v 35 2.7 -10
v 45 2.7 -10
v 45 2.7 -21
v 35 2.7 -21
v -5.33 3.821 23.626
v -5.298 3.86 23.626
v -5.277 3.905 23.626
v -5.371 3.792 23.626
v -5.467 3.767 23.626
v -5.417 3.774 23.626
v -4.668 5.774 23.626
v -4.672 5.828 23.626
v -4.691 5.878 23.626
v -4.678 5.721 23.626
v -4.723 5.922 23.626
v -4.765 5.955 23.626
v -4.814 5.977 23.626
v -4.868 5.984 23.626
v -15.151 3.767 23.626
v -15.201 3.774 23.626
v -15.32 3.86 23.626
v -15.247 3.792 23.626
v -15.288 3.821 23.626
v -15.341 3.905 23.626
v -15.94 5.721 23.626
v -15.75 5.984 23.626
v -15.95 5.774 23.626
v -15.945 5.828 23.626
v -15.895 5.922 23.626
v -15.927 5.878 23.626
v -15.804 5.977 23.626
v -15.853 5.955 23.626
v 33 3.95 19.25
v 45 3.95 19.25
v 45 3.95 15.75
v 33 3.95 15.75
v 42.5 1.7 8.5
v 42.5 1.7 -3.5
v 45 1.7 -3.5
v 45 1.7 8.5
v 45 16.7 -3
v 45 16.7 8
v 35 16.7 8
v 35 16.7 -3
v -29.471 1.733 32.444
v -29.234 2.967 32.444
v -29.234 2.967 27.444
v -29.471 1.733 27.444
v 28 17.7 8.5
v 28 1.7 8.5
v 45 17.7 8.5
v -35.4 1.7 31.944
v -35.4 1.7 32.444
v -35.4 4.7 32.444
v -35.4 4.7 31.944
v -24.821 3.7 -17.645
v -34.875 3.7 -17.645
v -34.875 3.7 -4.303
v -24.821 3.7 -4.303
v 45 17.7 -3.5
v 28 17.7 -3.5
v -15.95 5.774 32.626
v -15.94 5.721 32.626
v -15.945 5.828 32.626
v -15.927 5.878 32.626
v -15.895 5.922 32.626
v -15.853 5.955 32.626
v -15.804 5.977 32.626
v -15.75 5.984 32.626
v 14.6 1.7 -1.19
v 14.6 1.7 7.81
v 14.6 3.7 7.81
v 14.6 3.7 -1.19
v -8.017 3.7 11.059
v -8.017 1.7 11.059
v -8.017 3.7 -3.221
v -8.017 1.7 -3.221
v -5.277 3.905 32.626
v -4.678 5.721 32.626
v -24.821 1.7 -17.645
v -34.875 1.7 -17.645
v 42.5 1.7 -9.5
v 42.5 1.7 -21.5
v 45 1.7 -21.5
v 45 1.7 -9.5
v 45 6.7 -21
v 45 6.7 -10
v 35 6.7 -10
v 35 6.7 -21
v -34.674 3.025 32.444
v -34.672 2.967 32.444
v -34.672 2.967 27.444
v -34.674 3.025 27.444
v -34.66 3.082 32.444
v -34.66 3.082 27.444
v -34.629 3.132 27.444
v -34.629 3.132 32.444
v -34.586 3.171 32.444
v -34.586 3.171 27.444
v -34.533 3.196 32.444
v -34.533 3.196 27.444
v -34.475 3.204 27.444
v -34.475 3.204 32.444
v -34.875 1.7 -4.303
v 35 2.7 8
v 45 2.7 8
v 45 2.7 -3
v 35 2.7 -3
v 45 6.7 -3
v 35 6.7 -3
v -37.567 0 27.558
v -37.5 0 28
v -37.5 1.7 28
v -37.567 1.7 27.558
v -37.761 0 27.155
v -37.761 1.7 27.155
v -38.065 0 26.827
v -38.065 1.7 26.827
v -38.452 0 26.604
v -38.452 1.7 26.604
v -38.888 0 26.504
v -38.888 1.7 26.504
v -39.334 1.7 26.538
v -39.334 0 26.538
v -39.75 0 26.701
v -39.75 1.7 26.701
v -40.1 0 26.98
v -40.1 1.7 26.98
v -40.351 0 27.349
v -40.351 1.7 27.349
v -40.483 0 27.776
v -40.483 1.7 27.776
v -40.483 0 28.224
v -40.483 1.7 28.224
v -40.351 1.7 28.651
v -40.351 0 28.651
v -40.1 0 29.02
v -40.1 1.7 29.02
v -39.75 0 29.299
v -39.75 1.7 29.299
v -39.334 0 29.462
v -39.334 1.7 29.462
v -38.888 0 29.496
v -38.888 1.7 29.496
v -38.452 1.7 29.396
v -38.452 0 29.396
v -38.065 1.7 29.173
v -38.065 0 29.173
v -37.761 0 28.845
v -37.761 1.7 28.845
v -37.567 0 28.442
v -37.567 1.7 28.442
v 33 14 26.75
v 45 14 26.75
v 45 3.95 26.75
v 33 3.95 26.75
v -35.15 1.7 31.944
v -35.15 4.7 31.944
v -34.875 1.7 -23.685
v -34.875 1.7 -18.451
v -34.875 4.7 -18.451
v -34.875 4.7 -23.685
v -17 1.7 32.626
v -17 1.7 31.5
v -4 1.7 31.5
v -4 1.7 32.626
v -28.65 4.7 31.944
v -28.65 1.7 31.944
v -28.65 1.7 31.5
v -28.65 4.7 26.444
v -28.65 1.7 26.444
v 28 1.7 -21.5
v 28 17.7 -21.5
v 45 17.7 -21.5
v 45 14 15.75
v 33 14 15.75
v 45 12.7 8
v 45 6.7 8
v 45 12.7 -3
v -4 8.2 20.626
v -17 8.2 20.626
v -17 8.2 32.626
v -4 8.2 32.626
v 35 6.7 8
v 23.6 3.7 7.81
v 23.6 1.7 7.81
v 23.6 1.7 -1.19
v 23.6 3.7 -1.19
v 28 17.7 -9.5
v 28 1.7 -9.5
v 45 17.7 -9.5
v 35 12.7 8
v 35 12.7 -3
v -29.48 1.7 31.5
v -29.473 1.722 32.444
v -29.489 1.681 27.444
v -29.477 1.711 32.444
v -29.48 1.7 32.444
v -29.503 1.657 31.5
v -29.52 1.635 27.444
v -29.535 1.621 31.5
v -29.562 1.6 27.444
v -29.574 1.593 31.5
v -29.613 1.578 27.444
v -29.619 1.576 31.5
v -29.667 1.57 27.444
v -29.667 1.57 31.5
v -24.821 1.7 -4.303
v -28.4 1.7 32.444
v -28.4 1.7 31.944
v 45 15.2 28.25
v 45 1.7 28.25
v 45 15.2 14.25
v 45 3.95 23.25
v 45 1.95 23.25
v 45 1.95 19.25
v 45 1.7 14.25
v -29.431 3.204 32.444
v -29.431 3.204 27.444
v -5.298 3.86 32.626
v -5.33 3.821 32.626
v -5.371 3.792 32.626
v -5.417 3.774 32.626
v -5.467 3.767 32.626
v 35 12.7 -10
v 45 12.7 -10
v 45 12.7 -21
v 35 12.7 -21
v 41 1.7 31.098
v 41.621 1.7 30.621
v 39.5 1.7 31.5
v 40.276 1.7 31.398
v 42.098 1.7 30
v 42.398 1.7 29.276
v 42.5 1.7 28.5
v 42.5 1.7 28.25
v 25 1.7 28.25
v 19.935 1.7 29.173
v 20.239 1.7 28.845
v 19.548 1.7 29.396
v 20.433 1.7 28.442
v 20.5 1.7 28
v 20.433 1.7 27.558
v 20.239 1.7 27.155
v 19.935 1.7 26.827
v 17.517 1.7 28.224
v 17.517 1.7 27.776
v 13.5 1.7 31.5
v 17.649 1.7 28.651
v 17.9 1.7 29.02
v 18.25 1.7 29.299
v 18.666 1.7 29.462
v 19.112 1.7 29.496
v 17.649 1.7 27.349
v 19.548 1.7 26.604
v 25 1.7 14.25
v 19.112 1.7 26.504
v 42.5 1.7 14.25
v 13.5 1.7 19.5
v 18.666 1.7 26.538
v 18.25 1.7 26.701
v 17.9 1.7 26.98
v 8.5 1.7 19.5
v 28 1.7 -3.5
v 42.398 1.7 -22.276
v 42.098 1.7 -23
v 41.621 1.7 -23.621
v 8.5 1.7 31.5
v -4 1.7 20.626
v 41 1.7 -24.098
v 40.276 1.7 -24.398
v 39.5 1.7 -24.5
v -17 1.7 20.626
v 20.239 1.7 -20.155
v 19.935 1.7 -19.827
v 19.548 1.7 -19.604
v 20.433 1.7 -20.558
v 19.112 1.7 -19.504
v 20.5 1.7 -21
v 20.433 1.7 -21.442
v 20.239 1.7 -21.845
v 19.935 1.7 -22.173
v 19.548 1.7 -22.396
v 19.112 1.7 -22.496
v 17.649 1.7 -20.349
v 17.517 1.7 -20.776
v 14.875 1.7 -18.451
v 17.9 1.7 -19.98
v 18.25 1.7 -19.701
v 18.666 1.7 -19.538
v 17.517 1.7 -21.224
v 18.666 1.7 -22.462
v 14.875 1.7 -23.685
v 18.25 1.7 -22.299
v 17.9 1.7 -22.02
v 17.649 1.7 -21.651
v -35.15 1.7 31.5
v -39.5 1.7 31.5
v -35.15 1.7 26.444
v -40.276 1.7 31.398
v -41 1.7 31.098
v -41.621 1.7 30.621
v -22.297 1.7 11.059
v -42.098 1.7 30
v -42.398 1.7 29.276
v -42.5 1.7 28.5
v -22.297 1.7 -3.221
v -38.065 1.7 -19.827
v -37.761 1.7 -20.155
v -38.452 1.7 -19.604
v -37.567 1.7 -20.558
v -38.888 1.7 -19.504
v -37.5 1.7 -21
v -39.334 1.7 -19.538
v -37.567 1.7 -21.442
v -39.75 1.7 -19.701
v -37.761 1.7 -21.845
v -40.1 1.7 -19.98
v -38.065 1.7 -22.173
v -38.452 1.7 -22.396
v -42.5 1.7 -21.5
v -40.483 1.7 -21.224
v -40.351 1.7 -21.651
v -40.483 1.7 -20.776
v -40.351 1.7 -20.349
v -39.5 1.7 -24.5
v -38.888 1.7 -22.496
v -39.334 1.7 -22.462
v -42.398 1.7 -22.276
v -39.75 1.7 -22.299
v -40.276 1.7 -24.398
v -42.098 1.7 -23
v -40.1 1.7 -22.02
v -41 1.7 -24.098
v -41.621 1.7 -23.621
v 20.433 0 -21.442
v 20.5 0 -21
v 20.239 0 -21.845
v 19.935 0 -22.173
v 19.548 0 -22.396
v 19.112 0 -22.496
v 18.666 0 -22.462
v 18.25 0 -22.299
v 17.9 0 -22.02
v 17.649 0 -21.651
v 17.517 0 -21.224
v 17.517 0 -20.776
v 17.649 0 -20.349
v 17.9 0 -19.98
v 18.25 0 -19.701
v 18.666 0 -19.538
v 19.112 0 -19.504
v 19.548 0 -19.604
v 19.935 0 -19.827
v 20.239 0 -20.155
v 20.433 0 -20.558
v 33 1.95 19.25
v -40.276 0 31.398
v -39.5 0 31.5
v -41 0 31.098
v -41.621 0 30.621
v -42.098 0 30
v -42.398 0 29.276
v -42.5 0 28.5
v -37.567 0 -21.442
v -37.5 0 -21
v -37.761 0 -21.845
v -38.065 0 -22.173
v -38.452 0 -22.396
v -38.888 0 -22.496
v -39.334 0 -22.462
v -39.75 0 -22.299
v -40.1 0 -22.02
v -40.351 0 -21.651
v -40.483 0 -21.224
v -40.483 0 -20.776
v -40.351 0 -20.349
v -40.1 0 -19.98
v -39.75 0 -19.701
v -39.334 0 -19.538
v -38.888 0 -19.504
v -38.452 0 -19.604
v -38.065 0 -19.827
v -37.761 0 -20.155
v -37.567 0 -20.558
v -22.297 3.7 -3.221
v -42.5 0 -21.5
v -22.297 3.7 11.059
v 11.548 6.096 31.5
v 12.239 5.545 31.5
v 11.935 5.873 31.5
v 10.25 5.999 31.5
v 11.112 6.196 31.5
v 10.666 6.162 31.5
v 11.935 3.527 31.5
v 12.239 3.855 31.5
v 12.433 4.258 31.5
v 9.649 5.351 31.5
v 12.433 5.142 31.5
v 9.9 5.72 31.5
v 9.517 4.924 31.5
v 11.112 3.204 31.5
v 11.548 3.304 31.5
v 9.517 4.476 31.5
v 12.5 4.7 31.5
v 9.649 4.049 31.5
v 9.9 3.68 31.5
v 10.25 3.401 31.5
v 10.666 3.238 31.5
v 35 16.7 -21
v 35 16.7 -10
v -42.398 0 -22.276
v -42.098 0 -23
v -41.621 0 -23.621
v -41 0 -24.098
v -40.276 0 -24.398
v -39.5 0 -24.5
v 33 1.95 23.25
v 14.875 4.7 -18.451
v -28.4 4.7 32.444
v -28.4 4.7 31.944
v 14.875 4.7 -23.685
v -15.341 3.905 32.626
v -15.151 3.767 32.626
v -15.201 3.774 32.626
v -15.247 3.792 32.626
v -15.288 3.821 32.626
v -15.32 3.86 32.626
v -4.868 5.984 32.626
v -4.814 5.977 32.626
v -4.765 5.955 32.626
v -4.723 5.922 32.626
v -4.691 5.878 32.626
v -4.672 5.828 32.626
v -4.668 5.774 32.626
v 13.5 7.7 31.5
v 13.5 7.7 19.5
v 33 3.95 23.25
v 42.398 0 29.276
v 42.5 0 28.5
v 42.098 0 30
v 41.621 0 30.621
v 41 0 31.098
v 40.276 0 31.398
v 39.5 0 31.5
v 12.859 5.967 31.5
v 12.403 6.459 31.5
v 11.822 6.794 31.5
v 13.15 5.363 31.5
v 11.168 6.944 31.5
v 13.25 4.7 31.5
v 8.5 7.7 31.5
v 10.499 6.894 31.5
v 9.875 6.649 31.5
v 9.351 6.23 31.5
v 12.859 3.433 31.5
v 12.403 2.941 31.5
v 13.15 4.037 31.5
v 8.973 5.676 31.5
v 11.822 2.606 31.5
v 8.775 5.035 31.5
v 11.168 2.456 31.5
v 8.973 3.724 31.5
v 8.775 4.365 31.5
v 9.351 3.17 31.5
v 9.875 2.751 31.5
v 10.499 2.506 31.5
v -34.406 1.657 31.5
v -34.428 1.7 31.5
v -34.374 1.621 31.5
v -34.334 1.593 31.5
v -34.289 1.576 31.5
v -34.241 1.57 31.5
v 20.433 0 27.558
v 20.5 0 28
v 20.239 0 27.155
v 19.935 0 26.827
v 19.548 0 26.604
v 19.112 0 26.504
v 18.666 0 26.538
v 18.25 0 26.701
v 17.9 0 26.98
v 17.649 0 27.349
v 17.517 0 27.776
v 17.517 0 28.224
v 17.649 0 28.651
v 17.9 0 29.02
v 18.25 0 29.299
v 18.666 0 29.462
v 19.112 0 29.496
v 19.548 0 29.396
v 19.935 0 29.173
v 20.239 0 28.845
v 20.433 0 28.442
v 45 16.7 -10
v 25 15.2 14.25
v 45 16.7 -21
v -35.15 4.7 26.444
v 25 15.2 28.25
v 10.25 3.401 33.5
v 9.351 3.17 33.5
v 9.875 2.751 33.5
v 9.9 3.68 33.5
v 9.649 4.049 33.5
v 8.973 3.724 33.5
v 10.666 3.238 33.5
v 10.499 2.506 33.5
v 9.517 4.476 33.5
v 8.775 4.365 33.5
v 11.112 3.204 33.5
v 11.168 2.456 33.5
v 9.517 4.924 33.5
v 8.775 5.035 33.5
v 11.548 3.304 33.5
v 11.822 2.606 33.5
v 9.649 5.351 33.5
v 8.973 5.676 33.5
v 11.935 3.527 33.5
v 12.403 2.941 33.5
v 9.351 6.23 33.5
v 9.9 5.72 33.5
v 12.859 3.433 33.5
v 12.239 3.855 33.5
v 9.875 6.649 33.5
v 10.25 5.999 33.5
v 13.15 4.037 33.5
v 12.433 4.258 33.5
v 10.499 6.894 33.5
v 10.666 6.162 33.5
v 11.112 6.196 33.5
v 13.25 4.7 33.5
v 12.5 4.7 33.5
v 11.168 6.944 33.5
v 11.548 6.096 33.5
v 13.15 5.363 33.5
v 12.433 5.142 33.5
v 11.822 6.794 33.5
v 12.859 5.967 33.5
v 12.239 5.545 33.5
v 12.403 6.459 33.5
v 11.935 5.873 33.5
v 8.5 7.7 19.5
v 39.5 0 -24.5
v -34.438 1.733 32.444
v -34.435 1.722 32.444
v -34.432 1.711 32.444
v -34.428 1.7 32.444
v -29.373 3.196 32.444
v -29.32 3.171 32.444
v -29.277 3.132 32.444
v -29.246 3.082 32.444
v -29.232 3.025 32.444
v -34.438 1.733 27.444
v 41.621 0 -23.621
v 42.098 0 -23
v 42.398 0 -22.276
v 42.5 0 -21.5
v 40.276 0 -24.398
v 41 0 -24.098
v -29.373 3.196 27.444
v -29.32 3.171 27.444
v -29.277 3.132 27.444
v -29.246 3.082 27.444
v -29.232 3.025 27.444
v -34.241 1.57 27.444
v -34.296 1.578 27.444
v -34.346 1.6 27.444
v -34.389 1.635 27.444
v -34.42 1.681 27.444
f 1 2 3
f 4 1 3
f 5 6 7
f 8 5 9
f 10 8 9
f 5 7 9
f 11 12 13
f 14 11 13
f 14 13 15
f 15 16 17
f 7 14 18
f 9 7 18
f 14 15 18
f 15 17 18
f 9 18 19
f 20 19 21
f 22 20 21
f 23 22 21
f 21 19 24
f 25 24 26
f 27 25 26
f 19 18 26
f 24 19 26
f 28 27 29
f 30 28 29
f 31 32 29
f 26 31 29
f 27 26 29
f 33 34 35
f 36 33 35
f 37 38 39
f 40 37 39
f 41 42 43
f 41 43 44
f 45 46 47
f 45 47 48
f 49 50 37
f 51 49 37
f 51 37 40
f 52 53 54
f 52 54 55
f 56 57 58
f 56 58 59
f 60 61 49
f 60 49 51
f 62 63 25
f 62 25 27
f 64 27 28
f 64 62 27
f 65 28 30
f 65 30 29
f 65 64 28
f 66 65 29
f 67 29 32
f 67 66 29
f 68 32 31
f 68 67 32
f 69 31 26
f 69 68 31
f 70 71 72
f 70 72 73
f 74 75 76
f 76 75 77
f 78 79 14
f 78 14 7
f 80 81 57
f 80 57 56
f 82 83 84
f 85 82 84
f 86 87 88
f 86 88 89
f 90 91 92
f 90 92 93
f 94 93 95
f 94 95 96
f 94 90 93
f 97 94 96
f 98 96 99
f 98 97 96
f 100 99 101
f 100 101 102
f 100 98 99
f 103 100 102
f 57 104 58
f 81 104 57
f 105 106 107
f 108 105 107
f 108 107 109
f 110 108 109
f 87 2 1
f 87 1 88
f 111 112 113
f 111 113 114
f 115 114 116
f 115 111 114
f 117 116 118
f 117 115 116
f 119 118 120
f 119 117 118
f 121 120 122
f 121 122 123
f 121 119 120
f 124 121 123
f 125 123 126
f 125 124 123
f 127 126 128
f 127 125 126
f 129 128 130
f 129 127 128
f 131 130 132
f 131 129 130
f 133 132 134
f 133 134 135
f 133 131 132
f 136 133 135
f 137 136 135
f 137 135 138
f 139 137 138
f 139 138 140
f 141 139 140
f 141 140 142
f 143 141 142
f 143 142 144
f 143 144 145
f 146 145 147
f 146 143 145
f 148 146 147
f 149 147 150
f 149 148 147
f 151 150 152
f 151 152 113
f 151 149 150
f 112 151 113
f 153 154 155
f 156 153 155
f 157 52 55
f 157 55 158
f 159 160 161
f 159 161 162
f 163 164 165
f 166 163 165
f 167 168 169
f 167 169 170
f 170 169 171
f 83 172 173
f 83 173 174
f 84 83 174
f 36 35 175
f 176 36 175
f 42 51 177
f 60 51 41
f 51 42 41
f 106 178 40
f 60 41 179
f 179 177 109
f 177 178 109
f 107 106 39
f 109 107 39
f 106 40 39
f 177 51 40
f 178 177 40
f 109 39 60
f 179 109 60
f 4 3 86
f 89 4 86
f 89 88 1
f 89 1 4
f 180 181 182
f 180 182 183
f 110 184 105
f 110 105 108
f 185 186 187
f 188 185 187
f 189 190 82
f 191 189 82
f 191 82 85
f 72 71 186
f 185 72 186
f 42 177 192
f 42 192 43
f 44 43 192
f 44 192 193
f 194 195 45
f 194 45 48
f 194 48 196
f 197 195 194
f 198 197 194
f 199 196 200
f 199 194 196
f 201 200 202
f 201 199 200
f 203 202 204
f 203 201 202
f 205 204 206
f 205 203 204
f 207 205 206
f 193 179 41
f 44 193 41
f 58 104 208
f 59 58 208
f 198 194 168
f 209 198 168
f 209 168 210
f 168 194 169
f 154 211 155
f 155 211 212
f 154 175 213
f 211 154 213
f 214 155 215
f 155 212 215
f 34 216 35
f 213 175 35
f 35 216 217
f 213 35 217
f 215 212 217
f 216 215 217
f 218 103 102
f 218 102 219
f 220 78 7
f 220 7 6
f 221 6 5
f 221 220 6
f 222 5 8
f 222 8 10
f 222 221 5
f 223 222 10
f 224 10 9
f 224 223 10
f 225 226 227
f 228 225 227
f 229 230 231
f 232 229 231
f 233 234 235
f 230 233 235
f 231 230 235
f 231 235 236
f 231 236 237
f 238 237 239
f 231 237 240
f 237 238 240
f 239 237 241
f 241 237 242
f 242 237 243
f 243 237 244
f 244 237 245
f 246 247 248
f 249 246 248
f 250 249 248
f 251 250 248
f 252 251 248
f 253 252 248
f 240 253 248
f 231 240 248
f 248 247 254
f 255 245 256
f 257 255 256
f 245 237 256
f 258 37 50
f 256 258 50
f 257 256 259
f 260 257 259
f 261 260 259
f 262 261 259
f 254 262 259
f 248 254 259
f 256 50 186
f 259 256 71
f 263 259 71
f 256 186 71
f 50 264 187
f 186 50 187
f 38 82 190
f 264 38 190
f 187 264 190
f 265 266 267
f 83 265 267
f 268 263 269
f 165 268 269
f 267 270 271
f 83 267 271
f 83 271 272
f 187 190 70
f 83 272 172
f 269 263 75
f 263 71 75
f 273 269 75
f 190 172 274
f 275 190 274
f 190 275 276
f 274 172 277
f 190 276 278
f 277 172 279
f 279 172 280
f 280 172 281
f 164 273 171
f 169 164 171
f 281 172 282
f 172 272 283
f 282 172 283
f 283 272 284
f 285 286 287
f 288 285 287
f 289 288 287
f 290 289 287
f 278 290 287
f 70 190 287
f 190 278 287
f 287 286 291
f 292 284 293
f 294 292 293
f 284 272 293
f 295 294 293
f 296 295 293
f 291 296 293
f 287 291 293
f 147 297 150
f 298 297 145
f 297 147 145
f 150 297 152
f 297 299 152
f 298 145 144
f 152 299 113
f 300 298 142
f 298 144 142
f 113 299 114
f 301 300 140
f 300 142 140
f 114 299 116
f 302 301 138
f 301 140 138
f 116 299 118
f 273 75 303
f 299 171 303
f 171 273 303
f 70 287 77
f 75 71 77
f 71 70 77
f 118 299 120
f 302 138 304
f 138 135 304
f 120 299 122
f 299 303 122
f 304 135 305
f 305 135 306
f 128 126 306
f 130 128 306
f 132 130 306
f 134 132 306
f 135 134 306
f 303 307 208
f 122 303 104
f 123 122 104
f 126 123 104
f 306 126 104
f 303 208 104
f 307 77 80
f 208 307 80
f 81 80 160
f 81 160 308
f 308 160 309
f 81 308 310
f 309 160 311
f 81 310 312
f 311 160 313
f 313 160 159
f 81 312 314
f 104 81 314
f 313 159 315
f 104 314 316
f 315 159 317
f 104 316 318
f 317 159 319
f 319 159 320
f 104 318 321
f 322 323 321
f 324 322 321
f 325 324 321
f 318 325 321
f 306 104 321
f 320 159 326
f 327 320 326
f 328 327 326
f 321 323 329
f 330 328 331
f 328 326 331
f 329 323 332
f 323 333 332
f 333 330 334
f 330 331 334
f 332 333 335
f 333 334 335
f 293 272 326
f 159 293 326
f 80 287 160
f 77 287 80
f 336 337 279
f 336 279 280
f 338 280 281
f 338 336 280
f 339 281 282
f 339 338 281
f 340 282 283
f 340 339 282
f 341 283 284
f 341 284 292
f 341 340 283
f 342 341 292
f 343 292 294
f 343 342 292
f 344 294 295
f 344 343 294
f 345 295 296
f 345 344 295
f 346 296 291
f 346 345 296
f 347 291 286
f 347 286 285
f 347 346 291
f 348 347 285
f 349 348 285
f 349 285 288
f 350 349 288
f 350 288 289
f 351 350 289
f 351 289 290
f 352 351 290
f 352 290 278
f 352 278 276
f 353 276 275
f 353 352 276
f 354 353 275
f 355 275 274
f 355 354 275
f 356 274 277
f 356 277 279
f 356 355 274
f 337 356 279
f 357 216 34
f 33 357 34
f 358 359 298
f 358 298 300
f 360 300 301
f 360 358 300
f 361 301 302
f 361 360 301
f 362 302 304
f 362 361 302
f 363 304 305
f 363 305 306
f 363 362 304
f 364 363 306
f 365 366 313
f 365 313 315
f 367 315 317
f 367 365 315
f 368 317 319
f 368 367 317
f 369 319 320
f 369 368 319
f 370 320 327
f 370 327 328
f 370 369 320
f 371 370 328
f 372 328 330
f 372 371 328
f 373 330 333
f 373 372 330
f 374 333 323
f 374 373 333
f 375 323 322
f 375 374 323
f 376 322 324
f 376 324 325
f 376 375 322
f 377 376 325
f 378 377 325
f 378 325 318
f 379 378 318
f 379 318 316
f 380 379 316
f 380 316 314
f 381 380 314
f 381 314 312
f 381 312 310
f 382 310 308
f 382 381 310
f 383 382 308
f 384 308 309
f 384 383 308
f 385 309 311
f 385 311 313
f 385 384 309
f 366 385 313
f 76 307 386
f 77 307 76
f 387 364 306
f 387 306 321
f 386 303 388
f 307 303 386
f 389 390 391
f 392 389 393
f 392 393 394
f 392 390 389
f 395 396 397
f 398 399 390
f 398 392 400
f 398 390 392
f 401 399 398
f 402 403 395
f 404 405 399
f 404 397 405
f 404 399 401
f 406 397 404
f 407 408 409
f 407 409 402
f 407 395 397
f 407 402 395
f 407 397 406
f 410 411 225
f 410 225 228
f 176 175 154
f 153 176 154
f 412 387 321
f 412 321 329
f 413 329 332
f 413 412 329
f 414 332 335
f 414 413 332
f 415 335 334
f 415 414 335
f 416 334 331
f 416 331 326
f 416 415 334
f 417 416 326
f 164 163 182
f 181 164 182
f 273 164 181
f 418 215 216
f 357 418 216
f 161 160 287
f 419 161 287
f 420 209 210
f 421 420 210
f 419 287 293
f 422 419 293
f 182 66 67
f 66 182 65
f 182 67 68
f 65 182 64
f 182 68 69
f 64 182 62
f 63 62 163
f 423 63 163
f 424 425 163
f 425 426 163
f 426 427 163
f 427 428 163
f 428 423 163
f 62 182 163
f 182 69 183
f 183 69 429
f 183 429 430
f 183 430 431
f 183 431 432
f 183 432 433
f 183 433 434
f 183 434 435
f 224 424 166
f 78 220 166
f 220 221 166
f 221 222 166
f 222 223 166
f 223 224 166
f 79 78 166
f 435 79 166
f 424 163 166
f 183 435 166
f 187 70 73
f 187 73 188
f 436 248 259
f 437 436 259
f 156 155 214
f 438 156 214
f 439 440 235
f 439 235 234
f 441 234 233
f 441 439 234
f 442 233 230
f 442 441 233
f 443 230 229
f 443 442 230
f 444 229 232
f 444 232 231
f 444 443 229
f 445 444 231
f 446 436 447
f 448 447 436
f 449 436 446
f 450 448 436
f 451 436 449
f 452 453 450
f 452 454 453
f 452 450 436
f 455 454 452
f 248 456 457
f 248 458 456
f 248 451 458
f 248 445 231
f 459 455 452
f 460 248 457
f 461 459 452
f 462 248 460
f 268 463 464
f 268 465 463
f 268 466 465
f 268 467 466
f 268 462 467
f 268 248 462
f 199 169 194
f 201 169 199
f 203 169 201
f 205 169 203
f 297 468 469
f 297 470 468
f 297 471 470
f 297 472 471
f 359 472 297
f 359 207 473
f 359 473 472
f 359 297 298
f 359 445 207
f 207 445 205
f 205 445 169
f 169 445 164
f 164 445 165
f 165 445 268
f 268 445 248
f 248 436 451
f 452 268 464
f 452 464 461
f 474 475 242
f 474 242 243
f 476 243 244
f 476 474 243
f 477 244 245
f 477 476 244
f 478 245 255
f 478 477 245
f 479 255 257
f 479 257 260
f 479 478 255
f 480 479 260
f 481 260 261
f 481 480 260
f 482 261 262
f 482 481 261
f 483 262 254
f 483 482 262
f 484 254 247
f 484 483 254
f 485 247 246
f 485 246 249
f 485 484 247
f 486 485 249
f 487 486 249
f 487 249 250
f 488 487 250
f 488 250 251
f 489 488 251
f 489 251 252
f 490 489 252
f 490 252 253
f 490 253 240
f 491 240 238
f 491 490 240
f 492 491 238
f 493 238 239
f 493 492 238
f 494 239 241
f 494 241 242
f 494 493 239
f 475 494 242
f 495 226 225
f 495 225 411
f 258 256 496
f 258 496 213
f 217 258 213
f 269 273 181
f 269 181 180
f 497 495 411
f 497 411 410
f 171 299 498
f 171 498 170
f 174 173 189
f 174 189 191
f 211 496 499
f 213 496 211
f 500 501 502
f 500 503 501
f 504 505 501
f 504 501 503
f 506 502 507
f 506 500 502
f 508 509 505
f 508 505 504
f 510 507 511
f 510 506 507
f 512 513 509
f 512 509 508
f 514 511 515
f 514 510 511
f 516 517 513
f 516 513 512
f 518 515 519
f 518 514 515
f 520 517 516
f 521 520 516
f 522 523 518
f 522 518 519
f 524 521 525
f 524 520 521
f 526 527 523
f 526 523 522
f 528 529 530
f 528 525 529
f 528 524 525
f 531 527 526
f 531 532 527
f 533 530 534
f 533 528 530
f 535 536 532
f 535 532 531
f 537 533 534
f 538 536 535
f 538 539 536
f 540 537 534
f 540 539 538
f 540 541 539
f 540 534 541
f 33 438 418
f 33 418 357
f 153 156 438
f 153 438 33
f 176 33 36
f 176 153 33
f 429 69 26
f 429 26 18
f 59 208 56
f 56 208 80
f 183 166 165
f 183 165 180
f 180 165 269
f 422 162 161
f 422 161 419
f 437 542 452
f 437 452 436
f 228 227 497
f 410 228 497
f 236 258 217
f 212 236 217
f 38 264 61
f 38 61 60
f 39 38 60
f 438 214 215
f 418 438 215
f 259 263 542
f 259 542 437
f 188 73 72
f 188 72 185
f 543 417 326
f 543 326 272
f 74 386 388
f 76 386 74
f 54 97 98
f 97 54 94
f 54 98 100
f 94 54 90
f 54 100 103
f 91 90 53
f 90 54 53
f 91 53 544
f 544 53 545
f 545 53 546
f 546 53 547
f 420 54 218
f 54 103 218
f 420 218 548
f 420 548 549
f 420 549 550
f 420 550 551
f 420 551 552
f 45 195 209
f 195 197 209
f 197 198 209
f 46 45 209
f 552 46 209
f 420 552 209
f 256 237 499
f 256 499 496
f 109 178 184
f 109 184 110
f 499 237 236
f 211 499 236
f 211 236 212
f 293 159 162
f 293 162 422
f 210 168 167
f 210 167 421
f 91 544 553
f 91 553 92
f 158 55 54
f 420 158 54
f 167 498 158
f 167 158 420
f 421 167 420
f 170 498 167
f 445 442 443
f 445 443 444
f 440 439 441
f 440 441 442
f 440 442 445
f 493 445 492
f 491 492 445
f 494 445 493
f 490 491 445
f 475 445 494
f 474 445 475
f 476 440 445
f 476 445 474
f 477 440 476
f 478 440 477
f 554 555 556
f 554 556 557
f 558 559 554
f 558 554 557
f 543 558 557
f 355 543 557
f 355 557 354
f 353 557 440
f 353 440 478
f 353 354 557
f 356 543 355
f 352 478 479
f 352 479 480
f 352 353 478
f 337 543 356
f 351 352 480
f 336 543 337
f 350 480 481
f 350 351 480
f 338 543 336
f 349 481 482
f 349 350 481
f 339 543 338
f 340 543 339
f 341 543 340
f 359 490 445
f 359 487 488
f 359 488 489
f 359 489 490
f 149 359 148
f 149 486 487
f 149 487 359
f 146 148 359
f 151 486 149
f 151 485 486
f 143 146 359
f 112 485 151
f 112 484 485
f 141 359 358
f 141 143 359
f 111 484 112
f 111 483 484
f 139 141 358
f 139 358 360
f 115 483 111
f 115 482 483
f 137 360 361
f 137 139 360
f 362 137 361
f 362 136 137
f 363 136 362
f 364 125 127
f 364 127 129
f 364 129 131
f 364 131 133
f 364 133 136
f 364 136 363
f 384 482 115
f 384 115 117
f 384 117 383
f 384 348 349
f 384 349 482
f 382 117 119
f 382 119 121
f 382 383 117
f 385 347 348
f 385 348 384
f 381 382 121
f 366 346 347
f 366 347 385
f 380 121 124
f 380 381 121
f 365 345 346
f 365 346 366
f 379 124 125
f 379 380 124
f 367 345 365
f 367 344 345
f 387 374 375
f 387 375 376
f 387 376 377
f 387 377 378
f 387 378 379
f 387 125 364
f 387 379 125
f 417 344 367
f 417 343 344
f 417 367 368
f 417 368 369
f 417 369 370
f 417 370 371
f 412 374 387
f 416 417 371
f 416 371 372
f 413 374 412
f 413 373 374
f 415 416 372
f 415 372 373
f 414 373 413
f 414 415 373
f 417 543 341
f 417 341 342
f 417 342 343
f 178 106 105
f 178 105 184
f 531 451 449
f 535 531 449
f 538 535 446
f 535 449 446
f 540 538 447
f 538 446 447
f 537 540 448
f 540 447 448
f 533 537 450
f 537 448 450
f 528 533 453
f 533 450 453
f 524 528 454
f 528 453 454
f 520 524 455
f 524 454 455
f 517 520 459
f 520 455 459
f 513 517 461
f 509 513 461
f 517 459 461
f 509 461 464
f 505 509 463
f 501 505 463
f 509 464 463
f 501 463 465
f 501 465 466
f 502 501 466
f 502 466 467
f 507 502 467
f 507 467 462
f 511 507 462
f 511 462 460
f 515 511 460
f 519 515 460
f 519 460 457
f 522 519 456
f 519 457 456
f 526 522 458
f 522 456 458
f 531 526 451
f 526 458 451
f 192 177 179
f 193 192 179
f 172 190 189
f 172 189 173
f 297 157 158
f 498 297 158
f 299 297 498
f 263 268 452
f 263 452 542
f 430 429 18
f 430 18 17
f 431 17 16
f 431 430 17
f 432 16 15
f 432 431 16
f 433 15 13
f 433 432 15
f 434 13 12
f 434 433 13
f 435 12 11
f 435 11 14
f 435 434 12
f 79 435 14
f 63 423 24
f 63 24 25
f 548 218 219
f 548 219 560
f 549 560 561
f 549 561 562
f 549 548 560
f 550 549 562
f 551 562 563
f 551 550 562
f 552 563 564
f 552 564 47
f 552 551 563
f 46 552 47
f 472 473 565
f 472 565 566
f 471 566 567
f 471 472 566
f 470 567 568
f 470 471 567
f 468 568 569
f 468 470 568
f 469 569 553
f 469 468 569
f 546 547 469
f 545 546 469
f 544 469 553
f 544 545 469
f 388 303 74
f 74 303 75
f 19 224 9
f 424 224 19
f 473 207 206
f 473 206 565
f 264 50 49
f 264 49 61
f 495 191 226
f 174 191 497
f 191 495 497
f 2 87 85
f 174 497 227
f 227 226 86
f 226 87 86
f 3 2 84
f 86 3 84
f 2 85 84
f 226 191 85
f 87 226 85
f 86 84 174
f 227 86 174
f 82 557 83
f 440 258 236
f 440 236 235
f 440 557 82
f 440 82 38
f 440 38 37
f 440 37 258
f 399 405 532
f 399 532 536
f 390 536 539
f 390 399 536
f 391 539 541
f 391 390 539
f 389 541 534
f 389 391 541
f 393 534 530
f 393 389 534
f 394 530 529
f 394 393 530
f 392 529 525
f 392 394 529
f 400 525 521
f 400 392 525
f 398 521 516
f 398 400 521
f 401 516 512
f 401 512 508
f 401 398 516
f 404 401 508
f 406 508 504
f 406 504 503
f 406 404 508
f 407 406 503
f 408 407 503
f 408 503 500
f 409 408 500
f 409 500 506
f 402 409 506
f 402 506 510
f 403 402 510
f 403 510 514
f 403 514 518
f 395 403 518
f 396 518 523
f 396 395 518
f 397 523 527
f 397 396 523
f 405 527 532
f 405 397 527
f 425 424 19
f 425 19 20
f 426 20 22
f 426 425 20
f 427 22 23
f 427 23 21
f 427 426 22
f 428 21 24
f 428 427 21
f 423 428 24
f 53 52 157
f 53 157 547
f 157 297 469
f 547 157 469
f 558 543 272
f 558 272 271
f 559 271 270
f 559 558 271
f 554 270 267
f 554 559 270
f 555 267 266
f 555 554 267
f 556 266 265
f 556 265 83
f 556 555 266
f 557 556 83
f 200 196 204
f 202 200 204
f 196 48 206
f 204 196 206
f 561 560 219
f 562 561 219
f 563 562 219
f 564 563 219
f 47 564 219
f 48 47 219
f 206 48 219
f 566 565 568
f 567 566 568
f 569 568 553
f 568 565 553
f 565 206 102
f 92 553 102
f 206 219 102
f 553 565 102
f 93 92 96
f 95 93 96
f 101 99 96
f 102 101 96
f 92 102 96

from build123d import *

# Parameters (mm, degrees)
SKETCH1_R            = 3
SKETCH1_R_2          = 1.5
BOSS_EXTRUDE1_DEPTH  = 1.7
SKETCH4_W            = 49.75
SKETCH4_H            = 5.233449475
BOSS_EXTRUDE4_DEPTH  = 3
SKETCH7_W            = 6.5
SKETCH7_H            = 5.5
SKETCH7_W_2          = 7
SKETCH7_H_2          = 0.5
BOSS_EXTRUDE7_DEPTH  = 3
SKETCH8_W            = 13
SKETCH8_H            = 12
BOSS_EXTRUDE8_DEPTH  = 6.5
SKETCH9_W            = 5
SKETCH9_H            = 12
BOSS_EXTRUDE9_DEPTH  = 6
SKETCH10_W           = 20
SKETCH10_H           = 14
BOSS_EXTRUDE10_DEPTH = 13.5
SKETCH11_W           = 17
SKETCH11_H           = 12
BOSS_EXTRUDE11_DEPTH = 16
SKETCH12_W           = 10.053569384
SKETCH12_H           = 13.342225903
SKETCH12_W_2         = 14.279787724
SKETCH12_H_2         = 14.279787724
SKETCH12_W_3         = 9
SKETCH12_H_3         = 9
BOSS_EXTRUDE12_DEPTH = 2
SKETCH13_R           = 2.25
SKETCH13_R_2         = 1.5
BOSS_EXTRUDE13_DEPTH = 2
CUT_EXTRUDE1_DEPTH   = 9
CUT_EXTRUDE2_DEPTH   = 5
SKETCH16_W           = 11
SKETCH16_H           = 4
CUT_EXTRUDE3_DEPTH   = 10
SKETCH17_W           = 11
SKETCH17_H           = 4
CUT_EXTRUDE4_DEPTH   = 10
CUT_EXTRUDE5_DEPTH   = 12


with BuildPart() as part:
    # Sketch1 → Boss-Extrude1 (new body)
    with BuildSketch(Plane(origin=(0, 0, 0), x_dir=(1, 0, 0), z_dir=(0, 1, 0))):
        with BuildLine():
            ThreePointArc((39.5, 24.5), (41.621320344, 23.621320344), (42.5, 21.5))
            Line((42.5, 21.5), (42.5, -28.5))
            ThreePointArc((42.5, -28.5), (41.621320344, -30.621320344), (39.5, -31.5))
            Line((39.5, -31.5), (-39.5, -31.5))
            ThreePointArc((-39.5, -31.5), (-41.621320344, -30.621320344), (-42.5, -28.5))
            Line((-42.5, -28.5), (-42.5, 21.5))
            ThreePointArc((-42.5, 21.5), (-41.621320344, 23.621320344), (-39.5, 24.5))
            Line((-39.5, 24.5), (39.5, 24.5))
        make_face()
        with Locations((19, -28)):
            Circle(SKETCH1_R, mode=Mode.SUBTRACT)
        with Locations((19, 21)):
            Circle(SKETCH1_R, mode=Mode.SUBTRACT)
        with Locations((-39, -28)):
            Circle(SKETCH1_R, mode=Mode.SUBTRACT)
        with Locations((-39, 21)):
            Circle(SKETCH1_R, mode=Mode.SUBTRACT)
        with Locations((19, 21)):
            Circle(SKETCH1_R)
        with Locations((19, 21)):
            Circle(SKETCH1_R_2, mode=Mode.SUBTRACT)
        with Locations((-39, 21)):
            Circle(SKETCH1_R)
        with Locations((-39, 21)):
            Circle(SKETCH1_R_2, mode=Mode.SUBTRACT)
        with Locations((-39, -28)):
            Circle(SKETCH1_R)
        with Locations((-39, -28)):
            Circle(SKETCH1_R_2, mode=Mode.SUBTRACT)
        with Locations((19, -28)):
            Circle(SKETCH1_R)
        with Locations((19, -28)):
            Circle(SKETCH1_R_2, mode=Mode.SUBTRACT)
    extrude(amount=BOSS_EXTRUDE1_DEPTH)

    # Sketch4 → Boss-Extrude4 (add)
    with BuildSketch(Plane(origin=(0, 1.7, 0), x_dir=(1, 0, 0), z_dir=(0, 1, 0))):
        with Locations((-10, 21.068102783)):
            Rectangle(SKETCH4_W, SKETCH4_H)
    extrude(amount=BOSS_EXTRUDE4_DEPTH)

    # Sketch7 → Boss-Extrude7 (add)
    with BuildSketch(Plane(origin=(0, 1.7, 0), x_dir=(1, 0, 0), z_dir=(0, 1, 0))):
        with Locations((-31.9, -29.194183223)):
            Rectangle(SKETCH7_W, SKETCH7_H)
        with Locations((-31.9, -32.194183223)):
            Rectangle(SKETCH7_W_2, SKETCH7_H_2)
    extrude(amount=BOSS_EXTRUDE7_DEPTH)

    # Sketch8 → Boss-Extrude8 (add)
    with BuildSketch(Plane(origin=(0, 1.7, 0), x_dir=(1, 0, 0), z_dir=(0, 1, 0))):
        with Locations((-10.5, -26.626453528)):
            Rectangle(SKETCH8_W, SKETCH8_H)
    extrude(amount=BOSS_EXTRUDE8_DEPTH)

    # Sketch9 → Boss-Extrude9 (add)
    with BuildSketch(Plane(origin=(0, 1.7, 0), x_dir=(1, 0, 0), z_dir=(0, 1, 0))):
        with Locations((11, -25.5)):
            Rectangle(SKETCH9_W, SKETCH9_H)
    extrude(amount=BOSS_EXTRUDE9_DEPTH)

    # Sketch10 → Boss-Extrude10 (add)
    with BuildSketch(Plane(origin=(0, 1.7, 0), x_dir=(1, 0, 0), z_dir=(0, 1, 0))):
        with Locations((35, -21.25)):
            Rectangle(SKETCH10_W, SKETCH10_H)
    extrude(amount=BOSS_EXTRUDE10_DEPTH)

    # Sketch11 → Boss-Extrude11 (add)
    with BuildSketch(Plane(origin=(0, 1.7, 0), x_dir=(1, 0, 0), z_dir=(0, 1, 0))):
        with Locations((36.5, -2.5)):
            Rectangle(SKETCH11_W, SKETCH11_H)
        with Locations((36.5, 15.5)):
            Rectangle(SKETCH11_W, SKETCH11_H)
    extrude(amount=BOSS_EXTRUDE11_DEPTH)

    # Sketch12 → Boss-Extrude12 (add)
    with BuildSketch(Plane(origin=(0, 1.7, 0), x_dir=(1, 0, 0), z_dir=(0, 1, 0))):
        with Locations((-29.848215308, 10.97382243)):
            Rectangle(SKETCH12_W, SKETCH12_H)
        with Locations((-15.157331854, -3.918986484)):
            Rectangle(SKETCH12_W_2, SKETCH12_H_2)
        with Locations((19.1, -3.31)):
            Rectangle(SKETCH12_W_3, SKETCH12_H_3)
    extrude(amount=BOSS_EXTRUDE12_DEPTH)

    # Sketch13 → Boss-Extrude13 (add)
    with BuildSketch(Plane.XY.offset(31.5)):
        with Locations((11, 4.7)):
            Circle(SKETCH13_R)
        with Locations((11, 4.7)):
            Circle(SKETCH13_R_2, mode=Mode.SUBTRACT)
    extrude(amount=BOSS_EXTRUDE13_DEPTH)

    # Sketch14 → Cut-Extrude1 (cut)
    with BuildSketch(Plane.XY.offset(32.626453528)):
        with BuildLine():
            Line((-15.750323675, 5.983842352), (-4.86762122, 5.983842352))
            ThreePointArc((-4.86762122, 5.983842352), (-4.705559797, 5.901043441), (-4.677683467, 5.721203306))
            Line((-4.677683467, 5.721203306), (-5.276717124, 3.904778668))
            ThreePointArc((-5.276717124, 3.904778668), (-5.349453787, 3.805356292), (-5.466654877, 3.767417714))
            Line((-5.466654877, 3.767417714), (-15.151290018, 3.767417714))
            ThreePointArc((-15.151290018, 3.767417714), (-15.268491107, 3.805356292), (-15.341227771, 3.904778668))
            Line((-15.341227771, 3.904778668), (-15.940261428, 5.721203306))
            ThreePointArc((-15.940261428, 5.721203306), (-15.912385097, 5.901043441), (-15.750323675, 5.983842352))
        make_face()
    extrude(amount=-CUT_EXTRUDE1_DEPTH, mode=Mode.SUBTRACT)

    # Sketch15 → Cut-Extrude2 (cut)
    with BuildSketch(Plane.XY.offset(32.444183223)):
        with BuildLine():
            Line((-34.475250903, 3.20419671), (-29.43081526, 3.20419671))
            ThreePointArc((-29.43081526, 3.20419671), (-29.27664987, 3.131605628), (-29.234394805, 2.966527034))
            Line((-29.234394805, 2.966527034), (-29.471007813, 1.732759202))
            ThreePointArc((-29.471007813, 1.732759202), (-29.540019351, 1.616263488), (-29.667428269, 1.570428878))
            Line((-29.667428269, 1.570428878), (-34.24114908, 1.570428878))
            ThreePointArc((-34.24114908, 1.570428878), (-34.36870932, 1.616388672), (-34.437643137, 1.733145027))
            Line((-34.437643137, 1.733145027), (-34.67174496, 2.966912859))
            ThreePointArc((-34.67174496, 2.966912859), (-34.62929111, 3.13175695), (-34.475250903, 3.20419671))
        make_face()
    extrude(amount=-CUT_EXTRUDE2_DEPTH, mode=Mode.SUBTRACT)

    # Sketch16 → Cut-Extrude3 (cut)
    with BuildSketch(Plane(origin=(45, 0, 0), x_dir=(0, 0, -1), z_dir=(1, 0, 0))):
        with Locations((-2.5, 4.7)):
            Rectangle(SKETCH16_W, SKETCH16_H)
        with Locations((-2.5, 14.7)):
            Rectangle(SKETCH16_W, SKETCH16_H)
    extrude(amount=-CUT_EXTRUDE3_DEPTH, mode=Mode.SUBTRACT)

    # Sketch17 → Cut-Extrude4 (cut)
    with BuildSketch(Plane(origin=(45, 0, 0), x_dir=(0, 0, -1), z_dir=(1, 0, 0))):
        with Locations((15.5, 14.7)):
            Rectangle(SKETCH17_W, SKETCH17_H)
        with Locations((15.5, 4.7)):
            Rectangle(SKETCH17_W, SKETCH17_H)
    extrude(amount=-CUT_EXTRUDE4_DEPTH, mode=Mode.SUBTRACT)

    # Sketch18 → Cut-Extrude5 (cut)
    with BuildSketch(Plane(origin=(45, 0, 0), x_dir=(0, 0, -1), z_dir=(1, 0, 0))):
        Polygon((-26.75, 14), (-26.75, 3.95), (-23.25, 3.95), (-23.25, 1.95), (-19.25, 1.95), (-19.25, 3.95), (-15.75, 3.95), (-15.75, 14), align=None)
    extrude(amount=-CUT_EXTRUDE5_DEPTH, mode=Mode.SUBTRACT)


solid = part.part
